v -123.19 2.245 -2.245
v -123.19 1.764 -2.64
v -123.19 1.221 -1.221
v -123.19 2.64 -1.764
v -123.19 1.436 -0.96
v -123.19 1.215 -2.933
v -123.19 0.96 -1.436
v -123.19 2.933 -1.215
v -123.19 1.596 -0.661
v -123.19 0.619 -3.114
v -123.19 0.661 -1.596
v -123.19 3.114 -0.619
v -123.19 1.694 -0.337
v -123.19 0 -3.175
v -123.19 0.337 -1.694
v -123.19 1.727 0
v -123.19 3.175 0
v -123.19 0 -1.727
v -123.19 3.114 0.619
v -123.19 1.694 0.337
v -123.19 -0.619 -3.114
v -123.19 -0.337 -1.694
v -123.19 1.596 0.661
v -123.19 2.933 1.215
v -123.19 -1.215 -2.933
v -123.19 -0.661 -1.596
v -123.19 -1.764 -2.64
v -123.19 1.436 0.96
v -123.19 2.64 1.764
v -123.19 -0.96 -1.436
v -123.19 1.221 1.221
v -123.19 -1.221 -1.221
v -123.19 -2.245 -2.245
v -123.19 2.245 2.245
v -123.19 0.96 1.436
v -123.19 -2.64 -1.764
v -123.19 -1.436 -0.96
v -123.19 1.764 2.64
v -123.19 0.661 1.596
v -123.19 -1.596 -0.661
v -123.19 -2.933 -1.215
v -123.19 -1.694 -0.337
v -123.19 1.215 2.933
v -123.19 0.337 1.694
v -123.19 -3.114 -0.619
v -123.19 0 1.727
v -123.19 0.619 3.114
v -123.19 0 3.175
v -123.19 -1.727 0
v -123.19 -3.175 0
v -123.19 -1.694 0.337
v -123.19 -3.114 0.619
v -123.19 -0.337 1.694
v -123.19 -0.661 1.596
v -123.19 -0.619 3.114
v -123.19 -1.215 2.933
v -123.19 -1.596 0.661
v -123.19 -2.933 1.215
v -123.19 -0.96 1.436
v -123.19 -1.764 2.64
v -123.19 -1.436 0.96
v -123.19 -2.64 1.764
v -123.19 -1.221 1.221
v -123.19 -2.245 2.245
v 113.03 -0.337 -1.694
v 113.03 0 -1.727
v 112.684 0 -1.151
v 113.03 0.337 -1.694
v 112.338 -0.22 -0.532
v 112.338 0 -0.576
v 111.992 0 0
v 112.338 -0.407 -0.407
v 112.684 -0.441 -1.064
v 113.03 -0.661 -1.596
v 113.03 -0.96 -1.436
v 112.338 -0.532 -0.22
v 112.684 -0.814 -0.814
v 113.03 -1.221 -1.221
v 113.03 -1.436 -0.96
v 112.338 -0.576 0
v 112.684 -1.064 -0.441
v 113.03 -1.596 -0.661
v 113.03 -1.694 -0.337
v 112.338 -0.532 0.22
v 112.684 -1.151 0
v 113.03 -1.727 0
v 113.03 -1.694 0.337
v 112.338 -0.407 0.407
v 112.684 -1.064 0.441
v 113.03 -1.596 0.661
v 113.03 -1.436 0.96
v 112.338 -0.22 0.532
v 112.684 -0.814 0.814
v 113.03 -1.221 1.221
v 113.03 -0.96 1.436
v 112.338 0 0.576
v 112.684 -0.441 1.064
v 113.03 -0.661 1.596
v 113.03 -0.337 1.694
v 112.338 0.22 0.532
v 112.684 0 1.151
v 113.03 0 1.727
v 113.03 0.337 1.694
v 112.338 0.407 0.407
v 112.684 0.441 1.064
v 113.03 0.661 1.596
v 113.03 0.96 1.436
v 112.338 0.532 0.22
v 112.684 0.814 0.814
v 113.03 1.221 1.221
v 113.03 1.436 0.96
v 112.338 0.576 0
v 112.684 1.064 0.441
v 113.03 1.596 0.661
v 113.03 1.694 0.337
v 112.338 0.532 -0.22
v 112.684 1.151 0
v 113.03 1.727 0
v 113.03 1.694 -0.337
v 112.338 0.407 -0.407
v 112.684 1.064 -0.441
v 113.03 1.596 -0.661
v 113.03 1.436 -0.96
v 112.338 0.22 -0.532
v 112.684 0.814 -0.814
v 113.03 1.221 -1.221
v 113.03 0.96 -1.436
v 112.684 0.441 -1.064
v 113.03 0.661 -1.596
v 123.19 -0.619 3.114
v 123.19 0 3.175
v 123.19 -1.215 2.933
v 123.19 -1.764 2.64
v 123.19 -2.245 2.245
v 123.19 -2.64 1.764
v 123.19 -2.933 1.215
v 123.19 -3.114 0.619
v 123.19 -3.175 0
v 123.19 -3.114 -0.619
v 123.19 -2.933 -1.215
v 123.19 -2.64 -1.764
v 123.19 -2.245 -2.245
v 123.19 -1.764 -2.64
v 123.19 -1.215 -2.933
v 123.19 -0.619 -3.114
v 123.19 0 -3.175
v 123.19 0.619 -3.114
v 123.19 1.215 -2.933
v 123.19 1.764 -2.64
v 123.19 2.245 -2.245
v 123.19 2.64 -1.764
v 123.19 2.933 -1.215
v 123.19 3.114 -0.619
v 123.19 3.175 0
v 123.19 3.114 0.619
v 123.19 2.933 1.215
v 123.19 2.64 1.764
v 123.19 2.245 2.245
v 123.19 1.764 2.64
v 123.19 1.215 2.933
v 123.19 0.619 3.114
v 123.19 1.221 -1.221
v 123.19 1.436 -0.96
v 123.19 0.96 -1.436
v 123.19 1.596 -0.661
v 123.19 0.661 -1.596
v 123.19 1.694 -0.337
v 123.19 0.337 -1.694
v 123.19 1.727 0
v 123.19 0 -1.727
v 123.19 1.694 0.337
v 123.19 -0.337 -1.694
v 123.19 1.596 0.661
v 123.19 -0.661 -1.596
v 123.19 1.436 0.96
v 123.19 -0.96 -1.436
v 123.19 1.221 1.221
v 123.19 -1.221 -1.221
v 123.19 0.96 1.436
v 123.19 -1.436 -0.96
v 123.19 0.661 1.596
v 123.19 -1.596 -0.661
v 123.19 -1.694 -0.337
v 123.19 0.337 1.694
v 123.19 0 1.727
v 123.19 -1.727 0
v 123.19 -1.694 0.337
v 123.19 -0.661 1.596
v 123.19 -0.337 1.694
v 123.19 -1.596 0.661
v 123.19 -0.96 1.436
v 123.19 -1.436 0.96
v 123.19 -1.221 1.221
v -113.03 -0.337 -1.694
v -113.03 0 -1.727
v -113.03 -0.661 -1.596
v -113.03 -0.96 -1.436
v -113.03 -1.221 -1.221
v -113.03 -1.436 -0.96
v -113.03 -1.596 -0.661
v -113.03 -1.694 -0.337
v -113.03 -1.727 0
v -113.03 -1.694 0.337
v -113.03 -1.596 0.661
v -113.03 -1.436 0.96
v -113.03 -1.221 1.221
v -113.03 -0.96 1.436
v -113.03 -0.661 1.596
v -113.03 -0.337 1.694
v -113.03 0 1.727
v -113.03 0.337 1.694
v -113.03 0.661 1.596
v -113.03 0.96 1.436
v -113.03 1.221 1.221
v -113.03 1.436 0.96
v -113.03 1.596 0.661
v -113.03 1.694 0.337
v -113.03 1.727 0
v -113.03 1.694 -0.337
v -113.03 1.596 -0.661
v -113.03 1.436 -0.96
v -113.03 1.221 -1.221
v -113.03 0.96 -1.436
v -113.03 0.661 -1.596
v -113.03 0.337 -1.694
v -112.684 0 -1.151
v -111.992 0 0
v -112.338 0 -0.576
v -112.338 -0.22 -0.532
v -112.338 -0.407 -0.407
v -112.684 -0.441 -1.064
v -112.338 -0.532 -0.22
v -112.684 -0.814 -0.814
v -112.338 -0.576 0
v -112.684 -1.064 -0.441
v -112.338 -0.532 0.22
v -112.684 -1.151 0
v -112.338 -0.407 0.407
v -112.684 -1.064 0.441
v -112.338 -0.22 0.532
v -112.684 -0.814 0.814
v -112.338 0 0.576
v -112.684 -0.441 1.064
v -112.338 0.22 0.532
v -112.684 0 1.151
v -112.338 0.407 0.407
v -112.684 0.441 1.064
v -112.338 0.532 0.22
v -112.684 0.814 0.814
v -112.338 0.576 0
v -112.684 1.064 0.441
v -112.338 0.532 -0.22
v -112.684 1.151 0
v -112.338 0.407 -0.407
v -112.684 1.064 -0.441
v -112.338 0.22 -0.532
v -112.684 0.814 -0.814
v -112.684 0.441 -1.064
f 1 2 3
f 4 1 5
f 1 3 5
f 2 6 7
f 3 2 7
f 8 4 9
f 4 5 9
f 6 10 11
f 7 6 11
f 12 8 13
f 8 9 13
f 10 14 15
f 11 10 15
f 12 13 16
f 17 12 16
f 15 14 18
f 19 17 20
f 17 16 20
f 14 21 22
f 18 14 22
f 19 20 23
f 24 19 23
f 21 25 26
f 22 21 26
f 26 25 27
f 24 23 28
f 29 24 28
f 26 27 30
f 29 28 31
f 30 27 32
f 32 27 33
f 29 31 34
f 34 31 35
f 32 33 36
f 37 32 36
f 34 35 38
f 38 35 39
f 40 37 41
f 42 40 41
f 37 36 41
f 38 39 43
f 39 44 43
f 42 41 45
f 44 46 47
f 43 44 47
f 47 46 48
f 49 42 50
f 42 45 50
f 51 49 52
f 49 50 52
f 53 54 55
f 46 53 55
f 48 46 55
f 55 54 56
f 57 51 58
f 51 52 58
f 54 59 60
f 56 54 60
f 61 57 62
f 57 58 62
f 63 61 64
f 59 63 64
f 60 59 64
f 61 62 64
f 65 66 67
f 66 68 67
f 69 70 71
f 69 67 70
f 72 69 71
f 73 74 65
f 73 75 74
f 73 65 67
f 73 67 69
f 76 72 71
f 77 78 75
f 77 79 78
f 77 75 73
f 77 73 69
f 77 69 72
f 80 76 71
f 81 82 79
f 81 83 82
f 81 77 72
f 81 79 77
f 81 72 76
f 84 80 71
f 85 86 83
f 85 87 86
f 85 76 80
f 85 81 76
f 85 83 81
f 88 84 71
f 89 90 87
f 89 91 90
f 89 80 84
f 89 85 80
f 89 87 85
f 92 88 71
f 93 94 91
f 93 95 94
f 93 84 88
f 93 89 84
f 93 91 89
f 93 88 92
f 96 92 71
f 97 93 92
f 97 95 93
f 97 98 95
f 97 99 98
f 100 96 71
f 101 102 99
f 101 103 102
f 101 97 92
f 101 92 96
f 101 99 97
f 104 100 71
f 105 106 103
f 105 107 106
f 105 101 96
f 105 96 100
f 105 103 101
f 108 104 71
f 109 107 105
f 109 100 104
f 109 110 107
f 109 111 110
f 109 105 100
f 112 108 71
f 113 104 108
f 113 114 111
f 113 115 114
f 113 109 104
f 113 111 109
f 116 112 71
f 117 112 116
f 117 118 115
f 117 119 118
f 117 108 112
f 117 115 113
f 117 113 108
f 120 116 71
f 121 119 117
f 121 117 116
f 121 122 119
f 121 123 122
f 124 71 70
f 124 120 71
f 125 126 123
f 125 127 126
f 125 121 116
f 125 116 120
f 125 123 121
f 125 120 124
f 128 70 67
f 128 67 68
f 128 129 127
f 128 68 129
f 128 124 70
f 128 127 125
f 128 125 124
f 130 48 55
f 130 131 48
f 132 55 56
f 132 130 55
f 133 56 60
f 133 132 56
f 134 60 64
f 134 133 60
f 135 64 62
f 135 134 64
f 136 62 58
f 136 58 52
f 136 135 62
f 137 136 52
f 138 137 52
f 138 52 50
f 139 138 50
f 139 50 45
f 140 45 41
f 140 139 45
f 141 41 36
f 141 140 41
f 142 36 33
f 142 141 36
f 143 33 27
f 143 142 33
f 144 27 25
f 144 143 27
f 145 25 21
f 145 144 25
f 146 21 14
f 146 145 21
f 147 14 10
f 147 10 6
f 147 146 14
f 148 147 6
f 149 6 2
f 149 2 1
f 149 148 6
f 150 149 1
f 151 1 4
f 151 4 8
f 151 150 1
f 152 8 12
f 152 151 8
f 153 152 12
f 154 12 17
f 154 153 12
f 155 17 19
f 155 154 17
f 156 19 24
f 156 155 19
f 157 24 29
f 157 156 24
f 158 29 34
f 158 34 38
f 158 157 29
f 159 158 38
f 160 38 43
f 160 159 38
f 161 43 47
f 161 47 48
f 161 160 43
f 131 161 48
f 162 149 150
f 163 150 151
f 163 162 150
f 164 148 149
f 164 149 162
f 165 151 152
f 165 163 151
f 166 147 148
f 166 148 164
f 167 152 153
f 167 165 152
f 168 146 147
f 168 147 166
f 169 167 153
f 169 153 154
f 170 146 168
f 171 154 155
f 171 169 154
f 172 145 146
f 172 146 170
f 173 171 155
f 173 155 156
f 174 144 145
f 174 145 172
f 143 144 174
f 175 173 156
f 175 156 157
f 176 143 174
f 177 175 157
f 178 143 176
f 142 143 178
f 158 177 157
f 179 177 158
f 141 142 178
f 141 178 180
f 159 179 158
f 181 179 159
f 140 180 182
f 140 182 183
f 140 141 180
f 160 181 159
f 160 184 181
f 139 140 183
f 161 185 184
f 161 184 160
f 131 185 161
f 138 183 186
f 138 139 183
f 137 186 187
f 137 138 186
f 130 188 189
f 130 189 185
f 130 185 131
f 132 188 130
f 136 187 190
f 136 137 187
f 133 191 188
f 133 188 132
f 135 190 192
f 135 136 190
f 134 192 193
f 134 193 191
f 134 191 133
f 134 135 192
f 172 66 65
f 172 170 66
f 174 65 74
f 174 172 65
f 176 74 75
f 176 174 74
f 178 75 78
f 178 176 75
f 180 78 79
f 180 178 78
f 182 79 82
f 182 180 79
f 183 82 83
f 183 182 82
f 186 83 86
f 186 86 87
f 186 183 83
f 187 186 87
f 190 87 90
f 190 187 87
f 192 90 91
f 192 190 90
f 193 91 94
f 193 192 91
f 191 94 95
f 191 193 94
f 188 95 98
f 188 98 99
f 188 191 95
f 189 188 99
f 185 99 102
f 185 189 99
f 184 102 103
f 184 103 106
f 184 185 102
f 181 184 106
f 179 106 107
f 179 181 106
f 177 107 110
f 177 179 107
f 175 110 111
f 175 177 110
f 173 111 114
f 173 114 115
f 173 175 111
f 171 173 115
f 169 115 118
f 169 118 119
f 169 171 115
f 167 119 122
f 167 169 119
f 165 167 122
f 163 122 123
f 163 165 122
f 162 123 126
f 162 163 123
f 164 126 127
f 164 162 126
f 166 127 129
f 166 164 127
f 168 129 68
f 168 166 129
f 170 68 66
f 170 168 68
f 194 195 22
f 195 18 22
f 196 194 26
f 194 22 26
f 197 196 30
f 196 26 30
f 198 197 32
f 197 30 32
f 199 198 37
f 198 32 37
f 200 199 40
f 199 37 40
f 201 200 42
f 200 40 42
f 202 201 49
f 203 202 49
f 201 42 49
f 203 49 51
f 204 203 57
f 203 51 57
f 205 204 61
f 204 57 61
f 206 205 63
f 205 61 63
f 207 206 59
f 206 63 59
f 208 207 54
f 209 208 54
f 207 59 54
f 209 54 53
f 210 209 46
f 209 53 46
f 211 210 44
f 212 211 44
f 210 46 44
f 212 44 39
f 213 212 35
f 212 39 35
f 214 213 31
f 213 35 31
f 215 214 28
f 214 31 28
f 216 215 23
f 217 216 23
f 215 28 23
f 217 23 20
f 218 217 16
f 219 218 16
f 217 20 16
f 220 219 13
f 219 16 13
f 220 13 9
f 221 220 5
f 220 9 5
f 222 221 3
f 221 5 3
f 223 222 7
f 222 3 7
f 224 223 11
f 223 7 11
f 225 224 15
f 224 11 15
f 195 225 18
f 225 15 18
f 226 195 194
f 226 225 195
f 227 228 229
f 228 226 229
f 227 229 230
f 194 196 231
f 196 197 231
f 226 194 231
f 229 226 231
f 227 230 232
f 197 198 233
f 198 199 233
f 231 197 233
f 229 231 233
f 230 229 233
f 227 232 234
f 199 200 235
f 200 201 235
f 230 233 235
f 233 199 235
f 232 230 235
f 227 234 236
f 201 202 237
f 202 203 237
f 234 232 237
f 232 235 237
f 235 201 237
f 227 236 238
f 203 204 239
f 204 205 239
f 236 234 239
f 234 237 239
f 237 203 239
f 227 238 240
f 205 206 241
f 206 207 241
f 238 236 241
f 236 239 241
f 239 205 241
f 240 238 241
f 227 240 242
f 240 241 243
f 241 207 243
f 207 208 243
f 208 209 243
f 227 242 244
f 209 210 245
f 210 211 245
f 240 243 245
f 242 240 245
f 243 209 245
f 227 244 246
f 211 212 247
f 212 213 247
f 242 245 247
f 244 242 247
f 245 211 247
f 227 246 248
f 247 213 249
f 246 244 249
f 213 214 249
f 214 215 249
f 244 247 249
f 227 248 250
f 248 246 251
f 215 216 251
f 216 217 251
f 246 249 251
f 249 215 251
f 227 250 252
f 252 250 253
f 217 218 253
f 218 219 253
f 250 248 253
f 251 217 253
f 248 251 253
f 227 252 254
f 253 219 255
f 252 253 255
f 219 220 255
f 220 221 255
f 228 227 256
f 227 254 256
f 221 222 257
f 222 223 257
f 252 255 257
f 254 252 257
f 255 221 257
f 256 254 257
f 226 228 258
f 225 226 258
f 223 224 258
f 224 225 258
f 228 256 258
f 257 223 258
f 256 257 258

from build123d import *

# Parameters (mm, degrees)
SKETCH1_R           = 3.175
BOSS_EXTRUDE1_DEPTH = 123.19


with BuildPart() as part:
    # Sketch1 → Boss-Extrude1 (new, symmetric)
    with BuildSketch(Plane(origin=(0, 0, 0), x_dir=(0, 0, -1), z_dir=(1, 0, 0))):
        with Locations(Location((0, 0, 0), (0, 0, 180))):
            Circle(SKETCH1_R)
    extrude(amount=BOSS_EXTRUDE1_DEPTH, both=True)

    # Sketch4 → Tap Drill for #8-32 Tap1 (revolve, cut)
    with BuildSketch(Plane(origin=(123.19, 0, 0), x_dir=(0, 0, -1), z_dir=(0, 1, 0))):
        Polygon((0, 0), (0, 11.197806461), (1.7272, 10.16), (1.7272, 0), align=None)
    tap_drill_for_8_32_tap1 = revolve(axis=Axis((129.54, 0, 0), (-1, 0, 0)), mode=Mode.SUBTRACT)

    # Mirror1: Tap Drill for #8-32 Tap1 across plane
    add(tap_drill_for_8_32_tap1.mirror(Plane(origin=(0, 0, 0), x_dir=(0, 0, 1), z_dir=(1, 0, 0))), mode=Mode.SUBTRACT)


solid = part.part
